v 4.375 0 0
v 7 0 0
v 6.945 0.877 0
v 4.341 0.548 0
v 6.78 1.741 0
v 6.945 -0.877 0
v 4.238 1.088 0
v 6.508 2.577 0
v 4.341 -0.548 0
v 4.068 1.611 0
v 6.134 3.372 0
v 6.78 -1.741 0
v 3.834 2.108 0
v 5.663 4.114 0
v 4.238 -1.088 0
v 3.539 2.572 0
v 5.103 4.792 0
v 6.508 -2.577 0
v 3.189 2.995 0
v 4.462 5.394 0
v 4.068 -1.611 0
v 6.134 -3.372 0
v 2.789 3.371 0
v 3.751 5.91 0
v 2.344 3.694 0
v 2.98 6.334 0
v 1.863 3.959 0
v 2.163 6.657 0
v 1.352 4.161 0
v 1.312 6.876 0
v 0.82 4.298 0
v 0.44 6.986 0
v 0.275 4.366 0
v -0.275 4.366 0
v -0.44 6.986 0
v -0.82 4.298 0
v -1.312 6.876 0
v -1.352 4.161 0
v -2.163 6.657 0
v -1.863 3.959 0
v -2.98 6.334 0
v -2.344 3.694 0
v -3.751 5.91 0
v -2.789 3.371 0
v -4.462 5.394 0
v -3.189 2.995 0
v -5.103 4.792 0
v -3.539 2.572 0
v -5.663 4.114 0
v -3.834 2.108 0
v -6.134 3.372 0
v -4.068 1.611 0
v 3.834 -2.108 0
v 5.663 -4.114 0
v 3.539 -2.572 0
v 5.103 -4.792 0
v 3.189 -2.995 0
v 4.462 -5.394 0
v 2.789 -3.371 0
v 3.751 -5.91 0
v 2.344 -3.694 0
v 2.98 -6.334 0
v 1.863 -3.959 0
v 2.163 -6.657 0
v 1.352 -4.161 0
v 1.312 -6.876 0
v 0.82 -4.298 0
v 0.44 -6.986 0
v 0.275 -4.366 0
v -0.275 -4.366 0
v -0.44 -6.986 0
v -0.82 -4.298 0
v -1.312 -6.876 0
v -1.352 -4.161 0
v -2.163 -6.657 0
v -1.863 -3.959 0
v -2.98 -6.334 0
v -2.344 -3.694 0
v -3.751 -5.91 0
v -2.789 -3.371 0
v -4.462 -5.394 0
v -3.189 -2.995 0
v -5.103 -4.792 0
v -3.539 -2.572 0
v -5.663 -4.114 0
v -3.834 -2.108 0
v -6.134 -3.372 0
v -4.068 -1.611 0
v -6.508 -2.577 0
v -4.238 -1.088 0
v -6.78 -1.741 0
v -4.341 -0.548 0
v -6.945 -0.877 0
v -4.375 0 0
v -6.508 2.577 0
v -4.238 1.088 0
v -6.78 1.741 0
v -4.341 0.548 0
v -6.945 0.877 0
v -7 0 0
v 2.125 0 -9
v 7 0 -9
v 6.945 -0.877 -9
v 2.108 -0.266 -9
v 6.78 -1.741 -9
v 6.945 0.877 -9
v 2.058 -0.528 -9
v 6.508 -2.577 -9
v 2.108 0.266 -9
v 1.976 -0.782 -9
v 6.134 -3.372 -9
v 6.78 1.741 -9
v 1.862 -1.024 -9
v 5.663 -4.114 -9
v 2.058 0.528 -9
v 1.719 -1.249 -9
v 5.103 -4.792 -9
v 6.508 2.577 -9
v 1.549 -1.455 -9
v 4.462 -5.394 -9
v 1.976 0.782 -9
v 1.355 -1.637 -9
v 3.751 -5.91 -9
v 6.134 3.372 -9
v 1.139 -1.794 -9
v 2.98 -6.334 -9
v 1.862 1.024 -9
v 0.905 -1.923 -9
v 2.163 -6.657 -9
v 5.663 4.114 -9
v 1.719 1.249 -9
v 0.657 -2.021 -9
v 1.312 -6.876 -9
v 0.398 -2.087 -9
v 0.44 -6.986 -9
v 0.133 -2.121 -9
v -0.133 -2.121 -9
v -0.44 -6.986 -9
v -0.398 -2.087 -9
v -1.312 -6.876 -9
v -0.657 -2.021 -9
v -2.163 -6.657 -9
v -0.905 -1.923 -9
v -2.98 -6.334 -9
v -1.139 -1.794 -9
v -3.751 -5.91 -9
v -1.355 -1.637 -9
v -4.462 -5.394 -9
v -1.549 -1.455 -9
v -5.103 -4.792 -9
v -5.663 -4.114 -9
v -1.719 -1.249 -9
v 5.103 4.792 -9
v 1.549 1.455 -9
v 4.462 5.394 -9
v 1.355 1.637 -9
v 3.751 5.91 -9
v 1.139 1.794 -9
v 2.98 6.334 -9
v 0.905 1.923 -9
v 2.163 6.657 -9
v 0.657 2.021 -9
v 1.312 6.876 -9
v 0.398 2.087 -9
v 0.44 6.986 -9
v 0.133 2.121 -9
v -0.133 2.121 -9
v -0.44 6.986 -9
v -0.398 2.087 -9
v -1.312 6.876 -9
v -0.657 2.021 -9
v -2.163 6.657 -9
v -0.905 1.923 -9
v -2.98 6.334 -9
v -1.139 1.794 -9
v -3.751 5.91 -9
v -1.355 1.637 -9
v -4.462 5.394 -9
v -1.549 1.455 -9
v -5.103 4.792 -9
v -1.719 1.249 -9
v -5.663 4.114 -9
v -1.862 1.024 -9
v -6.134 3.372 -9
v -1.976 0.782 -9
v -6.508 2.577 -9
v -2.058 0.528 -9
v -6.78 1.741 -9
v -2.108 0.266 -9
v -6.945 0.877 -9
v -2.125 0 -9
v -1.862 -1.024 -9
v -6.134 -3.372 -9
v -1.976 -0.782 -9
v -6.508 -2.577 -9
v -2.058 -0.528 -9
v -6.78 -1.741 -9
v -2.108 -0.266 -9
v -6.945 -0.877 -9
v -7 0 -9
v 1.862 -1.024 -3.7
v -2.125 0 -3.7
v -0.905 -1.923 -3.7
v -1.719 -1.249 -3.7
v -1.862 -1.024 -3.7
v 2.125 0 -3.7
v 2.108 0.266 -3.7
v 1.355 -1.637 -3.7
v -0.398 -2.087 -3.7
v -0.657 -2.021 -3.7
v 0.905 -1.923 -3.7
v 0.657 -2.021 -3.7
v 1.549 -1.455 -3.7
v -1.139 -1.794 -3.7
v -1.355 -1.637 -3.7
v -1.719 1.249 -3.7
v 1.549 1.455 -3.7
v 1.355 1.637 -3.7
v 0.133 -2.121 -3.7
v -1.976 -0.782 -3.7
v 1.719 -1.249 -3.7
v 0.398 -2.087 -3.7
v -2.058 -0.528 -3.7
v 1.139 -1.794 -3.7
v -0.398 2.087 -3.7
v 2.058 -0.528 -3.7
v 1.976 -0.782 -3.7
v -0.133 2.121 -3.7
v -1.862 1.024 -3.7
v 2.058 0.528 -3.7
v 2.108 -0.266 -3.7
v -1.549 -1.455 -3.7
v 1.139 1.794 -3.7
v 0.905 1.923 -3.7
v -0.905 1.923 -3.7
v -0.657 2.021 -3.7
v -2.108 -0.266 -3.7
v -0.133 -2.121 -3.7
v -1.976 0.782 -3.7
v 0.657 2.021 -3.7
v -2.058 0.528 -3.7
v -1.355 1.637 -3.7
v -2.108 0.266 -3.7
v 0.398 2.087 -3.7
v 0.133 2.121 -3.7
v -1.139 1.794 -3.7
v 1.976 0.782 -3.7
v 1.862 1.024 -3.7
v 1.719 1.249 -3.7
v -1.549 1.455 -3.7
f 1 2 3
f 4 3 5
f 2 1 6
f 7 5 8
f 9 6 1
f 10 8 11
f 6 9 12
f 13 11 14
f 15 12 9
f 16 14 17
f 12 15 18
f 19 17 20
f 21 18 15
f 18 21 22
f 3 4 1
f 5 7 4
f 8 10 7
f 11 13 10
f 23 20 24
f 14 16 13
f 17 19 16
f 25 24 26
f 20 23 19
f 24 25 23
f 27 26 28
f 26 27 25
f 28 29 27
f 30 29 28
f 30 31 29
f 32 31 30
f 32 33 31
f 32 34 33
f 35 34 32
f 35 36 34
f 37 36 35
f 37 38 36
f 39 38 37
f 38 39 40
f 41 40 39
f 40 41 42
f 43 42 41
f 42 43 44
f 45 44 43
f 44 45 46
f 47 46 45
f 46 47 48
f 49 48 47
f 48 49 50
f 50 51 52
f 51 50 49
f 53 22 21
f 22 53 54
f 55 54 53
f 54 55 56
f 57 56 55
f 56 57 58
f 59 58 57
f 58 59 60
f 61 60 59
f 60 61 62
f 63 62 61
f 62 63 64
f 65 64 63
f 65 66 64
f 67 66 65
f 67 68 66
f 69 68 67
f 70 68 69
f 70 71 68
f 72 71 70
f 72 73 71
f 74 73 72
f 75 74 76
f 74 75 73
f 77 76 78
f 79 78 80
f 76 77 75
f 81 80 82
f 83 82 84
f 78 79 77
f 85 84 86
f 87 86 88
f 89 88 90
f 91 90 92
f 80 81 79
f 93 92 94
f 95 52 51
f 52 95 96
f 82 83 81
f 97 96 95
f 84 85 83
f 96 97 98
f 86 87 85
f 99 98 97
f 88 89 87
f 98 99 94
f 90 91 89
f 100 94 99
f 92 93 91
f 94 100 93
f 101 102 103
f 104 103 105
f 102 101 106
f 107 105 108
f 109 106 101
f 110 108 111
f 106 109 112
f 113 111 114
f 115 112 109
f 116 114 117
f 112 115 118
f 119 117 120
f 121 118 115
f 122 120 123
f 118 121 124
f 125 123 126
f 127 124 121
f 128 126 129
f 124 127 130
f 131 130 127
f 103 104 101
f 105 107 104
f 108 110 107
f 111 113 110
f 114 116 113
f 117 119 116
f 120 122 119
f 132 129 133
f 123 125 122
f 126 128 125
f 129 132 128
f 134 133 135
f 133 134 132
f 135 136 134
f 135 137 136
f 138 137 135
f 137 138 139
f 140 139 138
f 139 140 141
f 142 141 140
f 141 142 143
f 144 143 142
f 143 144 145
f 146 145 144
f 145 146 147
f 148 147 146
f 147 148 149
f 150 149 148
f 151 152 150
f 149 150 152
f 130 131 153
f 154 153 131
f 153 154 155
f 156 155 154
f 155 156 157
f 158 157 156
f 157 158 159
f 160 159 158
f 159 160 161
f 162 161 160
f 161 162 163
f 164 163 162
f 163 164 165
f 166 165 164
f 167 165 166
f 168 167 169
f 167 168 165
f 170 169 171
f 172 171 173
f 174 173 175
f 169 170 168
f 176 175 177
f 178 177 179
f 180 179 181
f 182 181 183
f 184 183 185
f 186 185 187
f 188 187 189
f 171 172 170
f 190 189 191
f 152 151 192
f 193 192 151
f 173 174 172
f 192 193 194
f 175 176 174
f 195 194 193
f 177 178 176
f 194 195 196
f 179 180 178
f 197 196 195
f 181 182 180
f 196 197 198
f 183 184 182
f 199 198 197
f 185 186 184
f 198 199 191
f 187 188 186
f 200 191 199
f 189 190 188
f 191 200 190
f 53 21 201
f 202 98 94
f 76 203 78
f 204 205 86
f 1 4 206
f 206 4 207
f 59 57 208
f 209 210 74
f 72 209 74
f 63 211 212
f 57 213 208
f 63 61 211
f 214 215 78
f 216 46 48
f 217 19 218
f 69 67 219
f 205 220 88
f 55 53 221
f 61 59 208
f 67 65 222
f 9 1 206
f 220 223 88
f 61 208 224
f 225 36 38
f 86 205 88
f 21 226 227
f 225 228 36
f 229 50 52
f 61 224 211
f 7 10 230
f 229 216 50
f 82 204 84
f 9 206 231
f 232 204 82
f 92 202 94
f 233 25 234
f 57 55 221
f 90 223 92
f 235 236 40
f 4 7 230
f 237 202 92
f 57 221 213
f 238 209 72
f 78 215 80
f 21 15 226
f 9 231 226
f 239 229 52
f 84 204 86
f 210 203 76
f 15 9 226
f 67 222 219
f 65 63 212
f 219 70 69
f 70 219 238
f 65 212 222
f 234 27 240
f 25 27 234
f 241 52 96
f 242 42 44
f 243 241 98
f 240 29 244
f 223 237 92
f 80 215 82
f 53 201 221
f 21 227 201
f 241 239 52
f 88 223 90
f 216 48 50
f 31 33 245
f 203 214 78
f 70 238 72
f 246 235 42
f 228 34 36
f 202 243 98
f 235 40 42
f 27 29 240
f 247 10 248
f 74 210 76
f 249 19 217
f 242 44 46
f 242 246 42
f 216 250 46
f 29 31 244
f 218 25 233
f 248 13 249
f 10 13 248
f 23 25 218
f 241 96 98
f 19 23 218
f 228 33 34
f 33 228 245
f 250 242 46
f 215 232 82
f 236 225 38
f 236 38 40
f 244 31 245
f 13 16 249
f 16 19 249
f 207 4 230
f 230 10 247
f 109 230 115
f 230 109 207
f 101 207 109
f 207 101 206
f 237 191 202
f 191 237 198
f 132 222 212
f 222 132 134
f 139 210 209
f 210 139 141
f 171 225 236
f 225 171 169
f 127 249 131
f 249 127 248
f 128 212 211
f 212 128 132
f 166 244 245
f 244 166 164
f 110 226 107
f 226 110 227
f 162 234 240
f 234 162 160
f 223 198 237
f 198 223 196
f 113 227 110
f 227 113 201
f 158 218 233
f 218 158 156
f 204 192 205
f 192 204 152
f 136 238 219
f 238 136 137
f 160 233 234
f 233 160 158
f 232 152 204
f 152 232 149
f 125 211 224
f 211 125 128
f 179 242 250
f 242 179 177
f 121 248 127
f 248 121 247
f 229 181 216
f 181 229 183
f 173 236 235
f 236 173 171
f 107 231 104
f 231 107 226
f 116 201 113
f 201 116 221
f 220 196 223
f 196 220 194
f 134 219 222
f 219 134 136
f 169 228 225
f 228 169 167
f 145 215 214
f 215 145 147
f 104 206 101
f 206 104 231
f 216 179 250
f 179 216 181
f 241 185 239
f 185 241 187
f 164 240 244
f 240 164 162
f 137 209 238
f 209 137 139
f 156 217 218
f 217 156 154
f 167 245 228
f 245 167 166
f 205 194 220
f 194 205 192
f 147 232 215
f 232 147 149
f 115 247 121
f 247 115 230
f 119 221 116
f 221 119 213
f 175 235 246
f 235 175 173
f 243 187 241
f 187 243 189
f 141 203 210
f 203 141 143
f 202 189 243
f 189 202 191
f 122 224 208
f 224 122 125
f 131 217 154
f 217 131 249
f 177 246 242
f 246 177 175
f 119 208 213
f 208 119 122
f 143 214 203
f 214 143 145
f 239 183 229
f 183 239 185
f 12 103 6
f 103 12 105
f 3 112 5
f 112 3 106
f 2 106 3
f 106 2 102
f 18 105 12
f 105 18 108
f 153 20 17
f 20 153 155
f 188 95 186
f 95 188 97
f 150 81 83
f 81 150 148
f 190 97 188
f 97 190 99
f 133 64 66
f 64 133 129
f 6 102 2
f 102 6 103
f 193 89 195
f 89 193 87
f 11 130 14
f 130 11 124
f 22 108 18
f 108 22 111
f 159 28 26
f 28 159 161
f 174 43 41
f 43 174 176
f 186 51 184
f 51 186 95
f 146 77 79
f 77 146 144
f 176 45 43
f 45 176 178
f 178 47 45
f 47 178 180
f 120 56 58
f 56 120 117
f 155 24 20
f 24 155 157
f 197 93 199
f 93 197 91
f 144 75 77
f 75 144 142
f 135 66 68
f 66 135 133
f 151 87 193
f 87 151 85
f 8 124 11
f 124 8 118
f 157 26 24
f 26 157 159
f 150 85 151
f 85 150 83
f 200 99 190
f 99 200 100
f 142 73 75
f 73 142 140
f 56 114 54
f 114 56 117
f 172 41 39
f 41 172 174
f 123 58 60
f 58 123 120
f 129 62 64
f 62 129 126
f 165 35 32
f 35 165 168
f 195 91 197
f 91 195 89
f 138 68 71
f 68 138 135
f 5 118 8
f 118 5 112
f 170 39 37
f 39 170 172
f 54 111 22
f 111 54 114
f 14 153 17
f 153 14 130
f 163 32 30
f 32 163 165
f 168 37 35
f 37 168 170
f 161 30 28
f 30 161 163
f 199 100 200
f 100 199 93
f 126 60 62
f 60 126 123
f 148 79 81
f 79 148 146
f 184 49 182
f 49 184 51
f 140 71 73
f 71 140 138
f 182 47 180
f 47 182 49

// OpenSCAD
$fn = 50;


difference() {
	union() {
		translate(v = [0, 0, -9.0000000000]) {
			cylinder(h = 9, r = 7.0000000000);
		}
	}
	union() {
		translate(v = [0, 0, 0]) {
			rotate(a = [0, 0, 0]) {
				difference() {
					union() {
						#translate(v = [0, 0, -9.0000000000]) {
							cylinder(h = 9, r = 2.0000000000);
						}
						#translate(v = [0, 0, -3.7000000000]) {
							cylinder(h = 3.7000000000, r1 = 2.1250000000, r2 = 4.3750000000);
						}
						#translate(v = [0, 0, -9.0000000000]) {
							cylinder(h = 9, r = 2.1250000000);
						}
						#translate(v = [0, 0, -9.0000000000]) {
							cylinder(h = 9, r = 2.0000000000);
						}
					}
					union();
				}
			}
		}
	}
}
